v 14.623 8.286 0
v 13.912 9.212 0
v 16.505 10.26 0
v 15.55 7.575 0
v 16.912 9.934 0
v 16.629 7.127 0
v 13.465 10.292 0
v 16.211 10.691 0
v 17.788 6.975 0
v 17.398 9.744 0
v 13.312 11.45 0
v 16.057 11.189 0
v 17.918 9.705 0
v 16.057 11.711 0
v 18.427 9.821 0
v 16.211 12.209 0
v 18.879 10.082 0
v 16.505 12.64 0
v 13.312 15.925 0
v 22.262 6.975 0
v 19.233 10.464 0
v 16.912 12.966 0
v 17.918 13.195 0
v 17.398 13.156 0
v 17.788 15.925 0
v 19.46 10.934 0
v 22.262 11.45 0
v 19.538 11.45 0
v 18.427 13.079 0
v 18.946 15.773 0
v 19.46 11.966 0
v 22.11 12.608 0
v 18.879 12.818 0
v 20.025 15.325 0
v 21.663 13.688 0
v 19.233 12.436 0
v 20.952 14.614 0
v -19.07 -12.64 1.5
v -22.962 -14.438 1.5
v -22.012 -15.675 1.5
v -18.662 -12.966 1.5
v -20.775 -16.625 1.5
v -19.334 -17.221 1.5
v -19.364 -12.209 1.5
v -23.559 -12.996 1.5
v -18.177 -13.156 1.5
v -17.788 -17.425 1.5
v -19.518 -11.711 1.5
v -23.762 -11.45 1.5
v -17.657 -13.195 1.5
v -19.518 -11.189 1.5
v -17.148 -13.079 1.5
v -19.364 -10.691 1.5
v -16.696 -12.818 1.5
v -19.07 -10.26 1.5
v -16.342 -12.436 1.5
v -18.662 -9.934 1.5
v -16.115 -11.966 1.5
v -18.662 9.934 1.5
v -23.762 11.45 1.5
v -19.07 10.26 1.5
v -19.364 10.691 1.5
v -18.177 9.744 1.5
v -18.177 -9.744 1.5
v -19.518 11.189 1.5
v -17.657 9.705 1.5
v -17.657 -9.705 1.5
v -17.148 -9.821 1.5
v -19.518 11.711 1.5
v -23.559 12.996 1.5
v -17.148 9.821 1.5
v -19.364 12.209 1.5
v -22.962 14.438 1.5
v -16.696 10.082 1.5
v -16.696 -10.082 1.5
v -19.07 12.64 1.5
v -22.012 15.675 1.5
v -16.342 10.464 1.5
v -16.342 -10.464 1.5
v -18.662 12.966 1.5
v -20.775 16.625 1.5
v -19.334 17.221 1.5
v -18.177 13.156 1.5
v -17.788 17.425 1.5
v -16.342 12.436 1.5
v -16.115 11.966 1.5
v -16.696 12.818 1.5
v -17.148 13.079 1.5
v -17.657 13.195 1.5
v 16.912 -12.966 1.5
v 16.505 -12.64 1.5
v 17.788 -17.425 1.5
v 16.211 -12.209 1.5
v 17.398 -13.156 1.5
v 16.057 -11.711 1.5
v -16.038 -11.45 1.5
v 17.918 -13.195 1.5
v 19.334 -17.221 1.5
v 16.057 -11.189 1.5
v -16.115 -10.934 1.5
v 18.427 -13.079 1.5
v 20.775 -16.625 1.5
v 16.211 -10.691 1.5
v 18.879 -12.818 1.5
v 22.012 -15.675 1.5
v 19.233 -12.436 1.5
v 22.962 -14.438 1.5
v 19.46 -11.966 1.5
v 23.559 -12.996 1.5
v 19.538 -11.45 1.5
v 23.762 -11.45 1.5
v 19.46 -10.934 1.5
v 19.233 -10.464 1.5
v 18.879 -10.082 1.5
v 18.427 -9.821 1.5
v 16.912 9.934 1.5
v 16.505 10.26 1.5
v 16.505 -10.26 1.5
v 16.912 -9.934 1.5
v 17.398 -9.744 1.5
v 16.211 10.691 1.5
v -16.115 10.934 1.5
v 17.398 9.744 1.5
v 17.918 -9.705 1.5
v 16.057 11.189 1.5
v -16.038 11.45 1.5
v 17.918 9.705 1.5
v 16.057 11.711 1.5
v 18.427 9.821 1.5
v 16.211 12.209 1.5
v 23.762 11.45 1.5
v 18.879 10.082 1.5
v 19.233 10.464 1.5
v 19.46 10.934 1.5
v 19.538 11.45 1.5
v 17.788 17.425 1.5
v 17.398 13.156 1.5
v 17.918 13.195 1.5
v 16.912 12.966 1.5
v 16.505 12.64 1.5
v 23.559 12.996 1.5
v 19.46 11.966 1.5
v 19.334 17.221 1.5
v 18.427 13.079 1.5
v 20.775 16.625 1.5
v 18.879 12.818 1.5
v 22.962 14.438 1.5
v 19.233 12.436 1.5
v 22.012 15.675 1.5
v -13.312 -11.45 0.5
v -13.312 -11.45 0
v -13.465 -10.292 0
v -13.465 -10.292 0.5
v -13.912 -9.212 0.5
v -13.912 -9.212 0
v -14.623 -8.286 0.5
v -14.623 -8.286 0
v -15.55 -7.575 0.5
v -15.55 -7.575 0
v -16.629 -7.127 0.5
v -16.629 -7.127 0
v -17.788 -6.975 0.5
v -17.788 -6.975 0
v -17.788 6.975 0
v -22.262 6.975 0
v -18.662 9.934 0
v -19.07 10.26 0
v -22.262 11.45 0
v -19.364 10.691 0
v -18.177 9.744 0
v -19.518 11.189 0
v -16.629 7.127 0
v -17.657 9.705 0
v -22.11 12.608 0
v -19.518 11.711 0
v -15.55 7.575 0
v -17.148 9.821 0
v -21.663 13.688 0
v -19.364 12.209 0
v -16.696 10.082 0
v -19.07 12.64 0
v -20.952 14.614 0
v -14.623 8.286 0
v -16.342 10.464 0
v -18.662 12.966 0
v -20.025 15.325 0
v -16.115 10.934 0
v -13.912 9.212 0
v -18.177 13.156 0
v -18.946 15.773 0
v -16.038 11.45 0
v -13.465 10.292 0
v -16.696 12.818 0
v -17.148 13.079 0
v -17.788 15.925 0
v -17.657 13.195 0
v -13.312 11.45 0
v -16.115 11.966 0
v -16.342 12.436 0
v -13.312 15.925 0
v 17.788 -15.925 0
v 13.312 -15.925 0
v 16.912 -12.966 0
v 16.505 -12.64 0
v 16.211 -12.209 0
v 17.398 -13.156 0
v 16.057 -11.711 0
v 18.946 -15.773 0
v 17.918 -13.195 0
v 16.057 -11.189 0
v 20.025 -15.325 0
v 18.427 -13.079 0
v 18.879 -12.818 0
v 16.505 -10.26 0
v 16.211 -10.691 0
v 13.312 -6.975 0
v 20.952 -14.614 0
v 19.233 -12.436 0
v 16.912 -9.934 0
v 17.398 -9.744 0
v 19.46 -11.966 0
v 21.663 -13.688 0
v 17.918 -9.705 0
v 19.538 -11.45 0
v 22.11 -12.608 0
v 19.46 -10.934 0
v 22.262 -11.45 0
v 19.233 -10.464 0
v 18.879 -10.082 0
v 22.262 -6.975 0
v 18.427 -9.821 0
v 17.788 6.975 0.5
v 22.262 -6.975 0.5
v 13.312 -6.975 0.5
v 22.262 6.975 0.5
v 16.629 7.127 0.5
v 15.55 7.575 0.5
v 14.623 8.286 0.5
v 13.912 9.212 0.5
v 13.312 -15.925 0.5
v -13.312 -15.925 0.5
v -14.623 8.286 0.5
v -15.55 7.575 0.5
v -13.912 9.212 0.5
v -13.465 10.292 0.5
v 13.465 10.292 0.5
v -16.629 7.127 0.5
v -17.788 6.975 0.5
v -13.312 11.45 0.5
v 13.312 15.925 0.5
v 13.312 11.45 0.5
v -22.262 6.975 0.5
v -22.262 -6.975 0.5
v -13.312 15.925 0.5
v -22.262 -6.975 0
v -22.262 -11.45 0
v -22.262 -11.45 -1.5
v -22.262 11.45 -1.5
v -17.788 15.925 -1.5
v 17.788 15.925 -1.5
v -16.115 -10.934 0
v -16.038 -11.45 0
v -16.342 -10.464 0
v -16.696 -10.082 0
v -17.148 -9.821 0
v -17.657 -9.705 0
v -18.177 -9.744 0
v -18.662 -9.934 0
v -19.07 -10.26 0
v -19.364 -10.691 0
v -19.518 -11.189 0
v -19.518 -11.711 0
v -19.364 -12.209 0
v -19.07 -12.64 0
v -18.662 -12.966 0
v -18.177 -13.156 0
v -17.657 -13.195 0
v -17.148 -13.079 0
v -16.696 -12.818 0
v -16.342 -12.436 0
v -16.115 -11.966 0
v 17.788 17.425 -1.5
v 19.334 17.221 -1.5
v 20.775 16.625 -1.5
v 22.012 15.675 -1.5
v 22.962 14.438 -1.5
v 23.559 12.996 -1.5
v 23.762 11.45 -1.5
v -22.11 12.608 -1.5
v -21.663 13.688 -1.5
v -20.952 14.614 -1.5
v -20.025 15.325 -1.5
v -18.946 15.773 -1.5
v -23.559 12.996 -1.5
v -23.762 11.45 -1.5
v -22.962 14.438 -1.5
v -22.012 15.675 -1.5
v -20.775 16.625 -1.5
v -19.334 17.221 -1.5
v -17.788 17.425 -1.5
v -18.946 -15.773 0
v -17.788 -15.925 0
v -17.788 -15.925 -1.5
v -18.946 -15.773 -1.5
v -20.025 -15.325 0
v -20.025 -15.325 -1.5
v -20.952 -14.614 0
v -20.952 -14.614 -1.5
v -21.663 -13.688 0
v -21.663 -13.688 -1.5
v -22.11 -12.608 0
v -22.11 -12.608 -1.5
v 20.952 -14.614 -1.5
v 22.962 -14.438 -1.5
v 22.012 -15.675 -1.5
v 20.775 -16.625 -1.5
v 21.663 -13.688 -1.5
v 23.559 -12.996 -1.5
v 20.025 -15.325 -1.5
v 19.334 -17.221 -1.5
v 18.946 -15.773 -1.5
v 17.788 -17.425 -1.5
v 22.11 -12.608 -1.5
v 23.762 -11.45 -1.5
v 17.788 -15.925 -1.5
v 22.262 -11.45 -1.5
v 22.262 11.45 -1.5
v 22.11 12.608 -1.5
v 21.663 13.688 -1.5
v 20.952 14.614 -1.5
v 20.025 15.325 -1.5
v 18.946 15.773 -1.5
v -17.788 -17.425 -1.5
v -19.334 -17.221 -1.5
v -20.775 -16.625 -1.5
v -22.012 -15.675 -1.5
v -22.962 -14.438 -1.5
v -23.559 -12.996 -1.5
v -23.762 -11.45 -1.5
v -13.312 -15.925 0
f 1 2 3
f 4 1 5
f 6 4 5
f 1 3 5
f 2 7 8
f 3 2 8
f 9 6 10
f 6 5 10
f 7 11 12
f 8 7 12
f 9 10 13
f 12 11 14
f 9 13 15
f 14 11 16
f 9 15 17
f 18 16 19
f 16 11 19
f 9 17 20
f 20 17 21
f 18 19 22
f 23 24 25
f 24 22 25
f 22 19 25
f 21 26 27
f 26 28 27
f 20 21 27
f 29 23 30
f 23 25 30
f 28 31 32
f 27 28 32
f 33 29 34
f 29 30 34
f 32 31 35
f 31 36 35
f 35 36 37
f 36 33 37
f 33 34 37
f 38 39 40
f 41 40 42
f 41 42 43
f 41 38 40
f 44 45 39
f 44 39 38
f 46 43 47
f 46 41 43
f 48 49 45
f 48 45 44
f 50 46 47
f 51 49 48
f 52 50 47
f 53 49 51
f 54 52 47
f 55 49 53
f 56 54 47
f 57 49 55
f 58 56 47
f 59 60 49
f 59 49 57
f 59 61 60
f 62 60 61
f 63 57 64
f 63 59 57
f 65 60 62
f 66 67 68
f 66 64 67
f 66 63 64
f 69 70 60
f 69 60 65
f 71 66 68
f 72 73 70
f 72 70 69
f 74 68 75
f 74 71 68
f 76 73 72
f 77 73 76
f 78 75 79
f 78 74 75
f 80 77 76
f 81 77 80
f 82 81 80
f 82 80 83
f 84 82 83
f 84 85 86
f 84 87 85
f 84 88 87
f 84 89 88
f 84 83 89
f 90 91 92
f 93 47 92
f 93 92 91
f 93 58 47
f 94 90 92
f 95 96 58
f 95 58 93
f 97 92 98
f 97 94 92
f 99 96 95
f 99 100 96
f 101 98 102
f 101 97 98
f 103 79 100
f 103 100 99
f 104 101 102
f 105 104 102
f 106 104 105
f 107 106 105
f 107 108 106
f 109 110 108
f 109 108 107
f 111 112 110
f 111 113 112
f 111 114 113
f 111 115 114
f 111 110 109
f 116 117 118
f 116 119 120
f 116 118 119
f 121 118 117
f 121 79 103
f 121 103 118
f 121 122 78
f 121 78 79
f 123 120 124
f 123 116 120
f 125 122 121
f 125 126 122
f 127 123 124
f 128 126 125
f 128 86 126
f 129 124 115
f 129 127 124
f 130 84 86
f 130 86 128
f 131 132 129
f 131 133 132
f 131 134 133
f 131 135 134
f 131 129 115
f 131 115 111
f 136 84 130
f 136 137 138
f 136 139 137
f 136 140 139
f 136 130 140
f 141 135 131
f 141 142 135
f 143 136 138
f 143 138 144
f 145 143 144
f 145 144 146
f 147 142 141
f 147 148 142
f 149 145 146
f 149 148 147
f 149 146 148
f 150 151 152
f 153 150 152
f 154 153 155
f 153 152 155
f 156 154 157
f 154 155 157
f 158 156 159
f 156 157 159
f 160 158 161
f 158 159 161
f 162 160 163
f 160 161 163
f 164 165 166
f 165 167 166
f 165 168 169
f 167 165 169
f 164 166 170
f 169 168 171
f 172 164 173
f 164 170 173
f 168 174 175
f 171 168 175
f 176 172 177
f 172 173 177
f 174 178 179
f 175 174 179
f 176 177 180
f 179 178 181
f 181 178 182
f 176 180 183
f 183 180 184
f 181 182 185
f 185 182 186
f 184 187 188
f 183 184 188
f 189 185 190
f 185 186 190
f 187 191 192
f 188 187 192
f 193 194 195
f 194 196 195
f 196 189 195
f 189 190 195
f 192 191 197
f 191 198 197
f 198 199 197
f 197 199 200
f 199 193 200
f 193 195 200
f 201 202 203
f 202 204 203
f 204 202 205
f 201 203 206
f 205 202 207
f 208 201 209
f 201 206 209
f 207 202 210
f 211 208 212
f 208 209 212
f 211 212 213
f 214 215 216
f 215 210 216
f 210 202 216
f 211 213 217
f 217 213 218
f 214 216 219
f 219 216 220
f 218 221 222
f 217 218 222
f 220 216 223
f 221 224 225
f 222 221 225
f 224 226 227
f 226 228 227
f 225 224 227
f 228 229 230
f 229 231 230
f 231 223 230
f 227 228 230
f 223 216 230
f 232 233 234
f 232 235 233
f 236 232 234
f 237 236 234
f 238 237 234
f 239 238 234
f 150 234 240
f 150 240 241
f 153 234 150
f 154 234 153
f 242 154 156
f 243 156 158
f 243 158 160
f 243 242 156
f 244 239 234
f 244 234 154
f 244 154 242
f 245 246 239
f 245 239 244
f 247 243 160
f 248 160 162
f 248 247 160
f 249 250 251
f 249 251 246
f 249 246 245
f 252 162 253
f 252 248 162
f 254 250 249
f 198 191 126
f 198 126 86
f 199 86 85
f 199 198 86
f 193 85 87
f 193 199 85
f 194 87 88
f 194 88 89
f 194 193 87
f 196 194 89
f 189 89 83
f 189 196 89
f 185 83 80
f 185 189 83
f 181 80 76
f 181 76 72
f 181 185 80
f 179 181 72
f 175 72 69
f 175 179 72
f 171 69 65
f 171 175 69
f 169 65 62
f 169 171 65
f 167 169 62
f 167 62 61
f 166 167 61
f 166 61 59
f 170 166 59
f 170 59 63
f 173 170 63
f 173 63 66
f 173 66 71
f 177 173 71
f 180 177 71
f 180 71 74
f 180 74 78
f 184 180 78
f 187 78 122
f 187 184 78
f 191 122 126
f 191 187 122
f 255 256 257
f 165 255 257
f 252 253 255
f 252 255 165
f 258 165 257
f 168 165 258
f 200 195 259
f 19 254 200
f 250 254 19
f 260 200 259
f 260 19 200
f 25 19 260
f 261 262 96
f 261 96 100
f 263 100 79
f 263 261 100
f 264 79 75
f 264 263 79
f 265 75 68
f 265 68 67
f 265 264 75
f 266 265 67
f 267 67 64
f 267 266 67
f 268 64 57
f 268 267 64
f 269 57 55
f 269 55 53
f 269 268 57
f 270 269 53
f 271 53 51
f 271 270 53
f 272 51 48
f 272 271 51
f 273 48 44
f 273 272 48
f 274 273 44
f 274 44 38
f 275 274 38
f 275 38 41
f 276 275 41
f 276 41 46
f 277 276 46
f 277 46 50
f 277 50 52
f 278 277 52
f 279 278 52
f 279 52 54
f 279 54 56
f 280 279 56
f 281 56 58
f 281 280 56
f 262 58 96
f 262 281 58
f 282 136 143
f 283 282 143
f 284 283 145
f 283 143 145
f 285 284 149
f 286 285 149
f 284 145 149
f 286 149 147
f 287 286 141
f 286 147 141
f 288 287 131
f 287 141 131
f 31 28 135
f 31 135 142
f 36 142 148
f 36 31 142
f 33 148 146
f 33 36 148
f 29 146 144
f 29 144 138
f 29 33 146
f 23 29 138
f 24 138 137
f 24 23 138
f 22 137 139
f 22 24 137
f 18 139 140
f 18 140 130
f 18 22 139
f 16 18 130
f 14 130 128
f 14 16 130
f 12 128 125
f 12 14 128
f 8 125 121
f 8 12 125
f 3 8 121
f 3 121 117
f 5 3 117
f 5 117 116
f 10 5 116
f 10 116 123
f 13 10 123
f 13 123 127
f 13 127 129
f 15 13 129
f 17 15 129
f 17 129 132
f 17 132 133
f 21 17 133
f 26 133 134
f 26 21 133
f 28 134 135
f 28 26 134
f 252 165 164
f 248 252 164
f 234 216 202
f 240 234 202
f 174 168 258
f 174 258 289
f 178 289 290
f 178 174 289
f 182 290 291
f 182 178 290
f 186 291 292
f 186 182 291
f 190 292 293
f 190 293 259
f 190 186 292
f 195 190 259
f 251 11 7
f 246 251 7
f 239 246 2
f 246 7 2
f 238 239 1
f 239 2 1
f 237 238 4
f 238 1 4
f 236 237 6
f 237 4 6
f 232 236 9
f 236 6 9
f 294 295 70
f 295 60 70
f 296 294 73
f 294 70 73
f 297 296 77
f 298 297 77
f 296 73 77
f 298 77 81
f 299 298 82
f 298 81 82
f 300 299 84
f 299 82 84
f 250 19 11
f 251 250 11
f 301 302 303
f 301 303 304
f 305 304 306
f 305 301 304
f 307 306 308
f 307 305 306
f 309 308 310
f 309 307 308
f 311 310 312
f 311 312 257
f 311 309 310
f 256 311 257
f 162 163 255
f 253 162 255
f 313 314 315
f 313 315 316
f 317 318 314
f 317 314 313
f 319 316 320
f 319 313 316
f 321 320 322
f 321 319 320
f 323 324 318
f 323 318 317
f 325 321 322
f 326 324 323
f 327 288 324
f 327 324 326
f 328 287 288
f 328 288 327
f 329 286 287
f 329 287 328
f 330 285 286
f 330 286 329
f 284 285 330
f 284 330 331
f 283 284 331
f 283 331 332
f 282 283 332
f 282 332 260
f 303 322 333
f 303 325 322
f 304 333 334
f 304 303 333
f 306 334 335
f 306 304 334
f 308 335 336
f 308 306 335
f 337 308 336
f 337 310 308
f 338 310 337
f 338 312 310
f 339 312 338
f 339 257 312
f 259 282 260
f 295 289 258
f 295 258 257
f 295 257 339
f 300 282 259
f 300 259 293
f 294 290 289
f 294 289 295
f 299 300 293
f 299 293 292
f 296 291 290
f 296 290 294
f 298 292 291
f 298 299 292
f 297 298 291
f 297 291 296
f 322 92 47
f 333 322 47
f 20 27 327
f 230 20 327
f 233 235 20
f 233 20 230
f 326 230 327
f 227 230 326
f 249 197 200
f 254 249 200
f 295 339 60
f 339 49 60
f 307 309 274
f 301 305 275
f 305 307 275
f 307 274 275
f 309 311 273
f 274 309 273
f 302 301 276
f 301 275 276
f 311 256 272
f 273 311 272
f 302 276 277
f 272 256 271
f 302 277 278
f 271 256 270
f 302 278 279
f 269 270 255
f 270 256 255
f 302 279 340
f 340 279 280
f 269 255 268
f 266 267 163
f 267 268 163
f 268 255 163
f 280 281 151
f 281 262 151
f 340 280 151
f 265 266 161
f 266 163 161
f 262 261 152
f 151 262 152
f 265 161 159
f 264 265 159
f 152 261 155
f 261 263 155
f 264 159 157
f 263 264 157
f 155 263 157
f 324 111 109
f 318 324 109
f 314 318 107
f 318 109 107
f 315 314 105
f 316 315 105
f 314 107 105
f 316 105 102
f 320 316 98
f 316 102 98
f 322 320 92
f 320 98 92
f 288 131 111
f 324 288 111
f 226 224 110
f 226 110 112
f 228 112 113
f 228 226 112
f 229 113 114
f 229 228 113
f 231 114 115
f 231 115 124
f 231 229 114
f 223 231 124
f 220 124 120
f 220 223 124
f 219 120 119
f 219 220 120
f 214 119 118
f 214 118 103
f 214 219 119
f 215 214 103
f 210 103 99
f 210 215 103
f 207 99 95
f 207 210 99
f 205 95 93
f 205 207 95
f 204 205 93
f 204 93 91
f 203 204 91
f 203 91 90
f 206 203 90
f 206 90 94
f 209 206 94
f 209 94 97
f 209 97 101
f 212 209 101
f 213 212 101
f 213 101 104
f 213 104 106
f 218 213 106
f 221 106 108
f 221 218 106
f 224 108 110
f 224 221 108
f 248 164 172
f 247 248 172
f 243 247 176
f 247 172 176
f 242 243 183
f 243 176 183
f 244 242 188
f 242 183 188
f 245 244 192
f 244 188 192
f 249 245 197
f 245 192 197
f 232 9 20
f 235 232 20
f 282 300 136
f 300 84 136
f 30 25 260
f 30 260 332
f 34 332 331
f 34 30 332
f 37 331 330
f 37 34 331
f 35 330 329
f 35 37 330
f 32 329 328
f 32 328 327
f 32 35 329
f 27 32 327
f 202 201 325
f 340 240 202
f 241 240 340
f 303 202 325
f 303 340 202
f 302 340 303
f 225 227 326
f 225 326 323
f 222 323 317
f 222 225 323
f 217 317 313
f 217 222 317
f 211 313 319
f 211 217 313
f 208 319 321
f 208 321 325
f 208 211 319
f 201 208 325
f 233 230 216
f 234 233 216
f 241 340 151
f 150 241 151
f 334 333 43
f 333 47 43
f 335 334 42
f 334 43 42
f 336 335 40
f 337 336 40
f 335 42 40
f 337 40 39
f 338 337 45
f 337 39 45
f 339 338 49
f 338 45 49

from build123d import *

# Parameters (mm, degrees)
SKETCH1_R           = 1.75
BOSS_EXTRUDE1_DEPTH = 1.5
BOSS_EXTRUDE2_DEPTH = 1.5
SKETCH3_W           = 26.625
SKETCH3_H           = 13.95
CUT_EXTRUDE1_DEPTH  = 0.5


with BuildPart() as part:
    # Sketch1 → Boss-Extrude1 (new body)
    with BuildSketch(Plane.XY):
        with BuildLine():
            ThreePointArc((23.7625, 11.45), (22.012463018, 15.674963018), (17.7875, 17.425))
            Line((17.7875, 17.425), (-17.7875, 17.425))
            ThreePointArc((-17.7875, 17.425), (-22.012463018, 15.674963018), (-23.7625, 11.45))
            Line((-23.7625, 11.45), (-23.7625, -11.45))
            ThreePointArc((-23.7625, -11.45), (-22.012463018, -15.674963018), (-17.7875, -17.425))
            Line((-17.7875, -17.425), (17.7875, -17.425))
            ThreePointArc((17.7875, -17.425), (22.012463018, -15.674963018), (23.7625, -11.45))
            Line((23.7625, -11.45), (23.7625, 11.45))
        make_face()
        with Locations((-17.7875, -11.45)):
            Circle(SKETCH1_R, mode=Mode.SUBTRACT)
        with Locations((17.7875, -11.45)):
            Circle(SKETCH1_R, mode=Mode.SUBTRACT)
        with Locations((17.7875, 11.45)):
            Circle(SKETCH1_R, mode=Mode.SUBTRACT)
        with Locations((-17.7875, 11.45)):
            Circle(SKETCH1_R, mode=Mode.SUBTRACT)
    extrude(amount=BOSS_EXTRUDE1_DEPTH)

    # Sketch2 → Boss-Extrude2 (add)
    with BuildSketch(Plane(origin=(0, 0, 0), x_dir=(-1, 0, 0), z_dir=(0, 0, -1))):
        with BuildLine():
            Line((-17.7875, -17.425), (17.7875, -17.425))
            ThreePointArc((17.7875, -17.425), (22.012463018, -15.674963018), (23.7625, -11.45))
            Line((23.7625, -11.45), (23.7625, 11.45))
            ThreePointArc((23.7625, 11.45), (22.012463018, 15.674963018), (17.7875, 17.425))
            Line((17.7875, 17.425), (-17.7875, 17.425))
            ThreePointArc((-17.7875, 17.425), (-22.012463018, 15.674963018), (-23.7625, 11.45))
            Line((-23.7625, 11.45), (-23.7625, -11.45))
            ThreePointArc((-23.7625, -11.45), (-22.012463018, -15.674963018), (-17.7875, -17.425))
        make_face()
        with BuildLine():
            Line((17.7875, 15.925), (-17.7875, 15.925))
            ThreePointArc((-17.7875, 15.925), (-20.951802846, 14.614302846), (-22.2625, 11.45))
            Line((-22.2625, 11.45), (-22.2625, -11.45))
            ThreePointArc((-22.2625, -11.45), (-20.951802846, -14.614302846), (-17.7875, -15.925))
            Line((-17.7875, -15.925), (17.7875, -15.925))
            ThreePointArc((17.7875, -15.925), (20.951802846, -14.614302846), (22.2625, -11.45))
            Line((22.2625, -11.45), (22.2625, 11.45))
            ThreePointArc((22.2625, 11.45), (20.951802846, 14.614302846), (17.7875, 15.925))
        make_face(mode=Mode.SUBTRACT)
    extrude(amount=BOSS_EXTRUDE2_DEPTH)

    # Sketch3 → Cut-Extrude1 (cut)
    with BuildSketch(Plane(origin=(0, 0, 0), x_dir=(-1, 0, 0), z_dir=(0, 0, -1))):
        with BuildLine():
            Line((-17.7875, 6.975), (-13.3125, 6.975))
            Line((-13.3125, 6.975), (-13.3125, 11.45))
            ThreePointArc((-13.3125, 11.45), (-14.623197154, 8.285697154), (-17.7875, 6.975))
        make_face()
        Polygon((-17.787500036, -6.975), (-13.3125, -6.975), (-13.3125, 6.975), (-17.7875, 6.975), (-22.2625, 6.975), (-22.2625, -6.975), align=None)
        Polygon((-13.3125, 6.975), (13.3125, 6.975), (13.3125, 11.45), (13.3125, 15.925), (-13.3125, 15.925), (-13.3125, 11.45), align=None)
        with BuildLine():
            Line((13.3125, 6.975), (17.7875, 6.975))
            ThreePointArc((17.7875, 6.975), (14.623197154, 8.285697154), (13.3125, 11.45))
            Line((13.3125, 11.45), (13.3125, 6.975))
        make_face()
        Polygon((17.7875, -6.975), (22.2625, -6.975), (22.2625, 6.975), (17.7875, 6.975), (13.3125, 6.975), (13.3125, -6.975), align=None)
        with BuildLine():
            ThreePointArc((13.3125, -11.45), (14.623197154, -8.285697154), (17.7875, -6.975))
            Line((17.7875, -6.975), (13.3125, -6.975))
            Line((13.3125, -6.975), (13.3125, -11.45))
        make_face()
        Polygon((13.3125, -11.45), (13.3125, -6.975), (-13.3125, -6.975), (-13.3125, -11.45), (-13.3125, -15.925), (13.3125, -15.925), align=None)
        Rectangle(SKETCH3_W, SKETCH3_H)
    extrude(amount=-CUT_EXTRUDE1_DEPTH, mode=Mode.SUBTRACT)


solid = part.part
